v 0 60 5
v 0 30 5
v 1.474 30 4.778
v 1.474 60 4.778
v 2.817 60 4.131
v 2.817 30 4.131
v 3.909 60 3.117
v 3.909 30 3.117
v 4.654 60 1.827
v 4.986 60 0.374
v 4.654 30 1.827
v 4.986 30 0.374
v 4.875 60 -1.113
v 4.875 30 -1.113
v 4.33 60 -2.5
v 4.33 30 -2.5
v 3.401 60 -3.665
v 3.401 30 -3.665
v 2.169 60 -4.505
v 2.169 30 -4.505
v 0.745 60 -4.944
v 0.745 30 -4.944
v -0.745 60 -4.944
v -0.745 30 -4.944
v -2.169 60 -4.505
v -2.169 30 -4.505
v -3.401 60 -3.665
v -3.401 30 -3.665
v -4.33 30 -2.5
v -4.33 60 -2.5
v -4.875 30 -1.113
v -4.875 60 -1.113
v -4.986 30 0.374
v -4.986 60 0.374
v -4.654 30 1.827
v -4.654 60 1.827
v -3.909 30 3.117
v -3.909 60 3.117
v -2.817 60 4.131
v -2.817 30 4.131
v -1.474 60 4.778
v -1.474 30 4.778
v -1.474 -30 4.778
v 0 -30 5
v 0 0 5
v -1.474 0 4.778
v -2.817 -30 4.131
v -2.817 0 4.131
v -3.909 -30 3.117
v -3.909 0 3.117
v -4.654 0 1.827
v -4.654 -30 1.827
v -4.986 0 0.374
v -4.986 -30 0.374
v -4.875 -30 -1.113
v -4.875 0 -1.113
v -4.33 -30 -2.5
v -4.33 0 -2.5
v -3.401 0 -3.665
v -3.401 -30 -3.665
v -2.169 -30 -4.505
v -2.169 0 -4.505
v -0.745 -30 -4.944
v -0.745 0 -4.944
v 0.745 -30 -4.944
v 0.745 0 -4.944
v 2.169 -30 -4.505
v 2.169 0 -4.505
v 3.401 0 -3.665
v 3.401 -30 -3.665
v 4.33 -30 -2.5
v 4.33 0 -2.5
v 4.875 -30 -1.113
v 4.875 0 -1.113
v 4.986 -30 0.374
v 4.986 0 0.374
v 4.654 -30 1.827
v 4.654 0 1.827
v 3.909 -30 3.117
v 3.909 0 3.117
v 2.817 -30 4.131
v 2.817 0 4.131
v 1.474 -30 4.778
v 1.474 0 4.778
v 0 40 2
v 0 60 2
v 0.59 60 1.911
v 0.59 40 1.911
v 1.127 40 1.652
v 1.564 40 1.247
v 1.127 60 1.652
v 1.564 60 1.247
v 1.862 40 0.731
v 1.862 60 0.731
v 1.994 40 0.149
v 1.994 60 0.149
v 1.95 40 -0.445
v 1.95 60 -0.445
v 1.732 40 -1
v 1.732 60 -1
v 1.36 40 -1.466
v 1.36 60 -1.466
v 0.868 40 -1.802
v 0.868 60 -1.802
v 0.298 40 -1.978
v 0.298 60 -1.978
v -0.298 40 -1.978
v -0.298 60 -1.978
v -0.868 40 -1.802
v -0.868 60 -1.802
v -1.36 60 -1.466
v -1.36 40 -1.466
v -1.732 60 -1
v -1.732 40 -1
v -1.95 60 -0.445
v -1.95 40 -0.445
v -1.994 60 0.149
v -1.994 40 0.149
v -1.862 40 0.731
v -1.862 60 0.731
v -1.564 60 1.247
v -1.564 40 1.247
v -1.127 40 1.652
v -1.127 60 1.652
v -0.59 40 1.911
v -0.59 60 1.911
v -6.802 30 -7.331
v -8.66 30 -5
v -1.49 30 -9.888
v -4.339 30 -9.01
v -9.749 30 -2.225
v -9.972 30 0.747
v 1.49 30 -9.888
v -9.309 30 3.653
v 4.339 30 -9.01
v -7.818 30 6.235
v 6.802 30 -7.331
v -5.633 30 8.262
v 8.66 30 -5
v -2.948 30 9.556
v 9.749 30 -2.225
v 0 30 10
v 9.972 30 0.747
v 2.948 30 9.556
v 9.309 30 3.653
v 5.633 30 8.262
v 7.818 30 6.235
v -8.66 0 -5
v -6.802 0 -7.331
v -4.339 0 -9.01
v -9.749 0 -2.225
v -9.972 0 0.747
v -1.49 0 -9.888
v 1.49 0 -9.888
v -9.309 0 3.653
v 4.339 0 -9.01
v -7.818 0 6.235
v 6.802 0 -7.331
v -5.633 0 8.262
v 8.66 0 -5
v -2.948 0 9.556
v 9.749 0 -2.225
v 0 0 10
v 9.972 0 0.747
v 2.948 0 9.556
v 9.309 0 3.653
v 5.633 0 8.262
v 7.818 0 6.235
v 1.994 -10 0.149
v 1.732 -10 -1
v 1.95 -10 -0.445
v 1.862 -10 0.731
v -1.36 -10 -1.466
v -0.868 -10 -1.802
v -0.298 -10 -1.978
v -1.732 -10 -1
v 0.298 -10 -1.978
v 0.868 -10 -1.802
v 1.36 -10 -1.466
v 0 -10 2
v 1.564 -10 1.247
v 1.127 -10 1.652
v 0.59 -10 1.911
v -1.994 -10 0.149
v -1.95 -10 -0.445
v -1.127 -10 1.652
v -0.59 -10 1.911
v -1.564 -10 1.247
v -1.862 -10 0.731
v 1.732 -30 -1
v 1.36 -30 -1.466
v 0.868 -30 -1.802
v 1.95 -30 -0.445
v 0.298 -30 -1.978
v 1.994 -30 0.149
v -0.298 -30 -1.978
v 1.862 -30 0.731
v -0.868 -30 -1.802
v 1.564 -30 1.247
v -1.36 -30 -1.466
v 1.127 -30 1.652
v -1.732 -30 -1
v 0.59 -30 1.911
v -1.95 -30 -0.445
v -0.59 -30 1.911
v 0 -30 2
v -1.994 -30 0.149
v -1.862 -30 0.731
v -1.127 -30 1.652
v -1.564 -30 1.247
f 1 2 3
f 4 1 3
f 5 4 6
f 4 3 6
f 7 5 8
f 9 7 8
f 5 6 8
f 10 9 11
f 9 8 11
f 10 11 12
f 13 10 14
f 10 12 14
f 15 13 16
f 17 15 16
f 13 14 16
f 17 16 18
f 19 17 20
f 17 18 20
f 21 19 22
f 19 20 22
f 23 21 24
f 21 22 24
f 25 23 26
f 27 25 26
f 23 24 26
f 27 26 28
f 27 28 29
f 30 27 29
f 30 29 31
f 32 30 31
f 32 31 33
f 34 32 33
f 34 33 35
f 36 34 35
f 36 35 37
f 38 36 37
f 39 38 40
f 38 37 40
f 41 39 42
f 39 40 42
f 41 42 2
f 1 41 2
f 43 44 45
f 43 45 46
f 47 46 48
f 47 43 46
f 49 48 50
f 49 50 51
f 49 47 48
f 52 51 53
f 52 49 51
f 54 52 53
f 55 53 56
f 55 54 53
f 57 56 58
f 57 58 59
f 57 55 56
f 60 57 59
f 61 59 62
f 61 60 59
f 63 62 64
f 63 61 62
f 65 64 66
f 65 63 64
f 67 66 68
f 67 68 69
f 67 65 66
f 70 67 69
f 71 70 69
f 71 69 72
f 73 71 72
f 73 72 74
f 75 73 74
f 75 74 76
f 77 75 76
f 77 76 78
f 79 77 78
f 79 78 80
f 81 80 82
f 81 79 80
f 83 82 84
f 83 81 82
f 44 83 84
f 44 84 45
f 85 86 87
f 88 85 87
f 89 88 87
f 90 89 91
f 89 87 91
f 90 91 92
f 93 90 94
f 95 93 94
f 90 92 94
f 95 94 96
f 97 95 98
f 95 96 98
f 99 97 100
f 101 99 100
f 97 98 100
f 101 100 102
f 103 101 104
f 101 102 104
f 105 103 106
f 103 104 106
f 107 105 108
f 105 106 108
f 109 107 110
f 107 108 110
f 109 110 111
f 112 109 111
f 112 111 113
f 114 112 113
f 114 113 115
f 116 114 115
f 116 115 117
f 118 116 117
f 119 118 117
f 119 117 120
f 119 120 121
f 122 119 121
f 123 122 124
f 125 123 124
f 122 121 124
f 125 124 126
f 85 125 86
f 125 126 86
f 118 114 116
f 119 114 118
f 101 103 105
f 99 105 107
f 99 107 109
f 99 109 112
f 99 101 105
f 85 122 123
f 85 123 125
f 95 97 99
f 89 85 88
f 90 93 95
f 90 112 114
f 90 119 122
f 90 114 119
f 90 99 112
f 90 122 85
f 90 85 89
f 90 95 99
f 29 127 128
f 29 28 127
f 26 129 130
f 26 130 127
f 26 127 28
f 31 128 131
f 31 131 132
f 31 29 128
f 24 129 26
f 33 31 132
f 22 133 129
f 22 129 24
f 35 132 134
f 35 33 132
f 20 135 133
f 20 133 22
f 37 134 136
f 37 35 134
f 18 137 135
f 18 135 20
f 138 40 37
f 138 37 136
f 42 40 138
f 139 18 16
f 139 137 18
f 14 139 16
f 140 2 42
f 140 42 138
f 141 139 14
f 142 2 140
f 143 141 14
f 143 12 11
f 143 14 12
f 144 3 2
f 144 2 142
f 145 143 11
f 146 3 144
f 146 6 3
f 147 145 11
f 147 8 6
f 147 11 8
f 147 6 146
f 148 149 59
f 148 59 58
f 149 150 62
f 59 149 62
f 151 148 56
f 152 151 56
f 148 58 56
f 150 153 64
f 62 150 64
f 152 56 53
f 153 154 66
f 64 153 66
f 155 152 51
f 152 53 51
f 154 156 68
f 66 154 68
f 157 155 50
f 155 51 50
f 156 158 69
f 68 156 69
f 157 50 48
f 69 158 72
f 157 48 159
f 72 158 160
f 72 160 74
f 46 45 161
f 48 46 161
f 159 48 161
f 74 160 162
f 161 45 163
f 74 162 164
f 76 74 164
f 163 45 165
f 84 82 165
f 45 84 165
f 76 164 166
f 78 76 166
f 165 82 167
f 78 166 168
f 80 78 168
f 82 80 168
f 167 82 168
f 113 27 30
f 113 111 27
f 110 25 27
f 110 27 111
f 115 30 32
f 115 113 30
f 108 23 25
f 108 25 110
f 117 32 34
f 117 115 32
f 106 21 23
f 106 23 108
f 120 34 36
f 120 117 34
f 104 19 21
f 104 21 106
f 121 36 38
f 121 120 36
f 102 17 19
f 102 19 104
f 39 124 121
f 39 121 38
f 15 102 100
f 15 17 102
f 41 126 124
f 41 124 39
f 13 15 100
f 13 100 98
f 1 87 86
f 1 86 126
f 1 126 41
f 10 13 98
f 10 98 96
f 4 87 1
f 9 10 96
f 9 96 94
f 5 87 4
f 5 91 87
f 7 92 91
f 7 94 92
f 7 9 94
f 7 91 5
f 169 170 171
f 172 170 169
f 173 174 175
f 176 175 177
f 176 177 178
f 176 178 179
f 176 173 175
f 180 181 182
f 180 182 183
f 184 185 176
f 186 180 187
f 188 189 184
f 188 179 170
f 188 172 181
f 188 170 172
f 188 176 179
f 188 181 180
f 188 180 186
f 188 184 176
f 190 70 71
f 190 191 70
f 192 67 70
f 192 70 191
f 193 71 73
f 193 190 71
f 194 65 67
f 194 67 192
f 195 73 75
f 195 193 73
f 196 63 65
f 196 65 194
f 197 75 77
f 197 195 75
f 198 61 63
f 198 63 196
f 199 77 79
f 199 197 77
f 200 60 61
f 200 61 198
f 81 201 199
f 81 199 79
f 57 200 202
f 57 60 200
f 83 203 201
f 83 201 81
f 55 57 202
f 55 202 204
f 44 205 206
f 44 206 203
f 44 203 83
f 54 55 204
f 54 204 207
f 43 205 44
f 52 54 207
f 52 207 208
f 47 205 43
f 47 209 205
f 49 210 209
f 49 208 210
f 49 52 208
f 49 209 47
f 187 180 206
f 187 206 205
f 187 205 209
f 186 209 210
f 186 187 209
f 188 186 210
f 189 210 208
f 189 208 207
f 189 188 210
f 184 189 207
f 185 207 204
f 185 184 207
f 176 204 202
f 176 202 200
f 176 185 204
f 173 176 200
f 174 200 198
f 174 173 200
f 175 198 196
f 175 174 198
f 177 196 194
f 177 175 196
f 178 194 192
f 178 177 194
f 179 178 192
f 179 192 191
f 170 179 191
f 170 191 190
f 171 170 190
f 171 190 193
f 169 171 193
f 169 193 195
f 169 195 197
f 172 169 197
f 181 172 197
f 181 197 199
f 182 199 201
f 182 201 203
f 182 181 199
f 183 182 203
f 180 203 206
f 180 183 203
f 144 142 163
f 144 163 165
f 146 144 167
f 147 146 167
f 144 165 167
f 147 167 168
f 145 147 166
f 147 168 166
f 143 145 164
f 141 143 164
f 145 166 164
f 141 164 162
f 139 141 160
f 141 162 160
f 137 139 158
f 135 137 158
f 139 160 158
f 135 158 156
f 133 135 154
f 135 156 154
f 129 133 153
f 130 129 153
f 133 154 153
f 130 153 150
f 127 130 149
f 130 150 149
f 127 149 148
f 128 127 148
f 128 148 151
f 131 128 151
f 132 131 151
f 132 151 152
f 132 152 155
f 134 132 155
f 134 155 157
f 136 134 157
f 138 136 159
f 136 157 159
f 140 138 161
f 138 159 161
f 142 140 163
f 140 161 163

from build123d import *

# Parameters (mm, degrees)
SKETCH_1_R          = 10
EXTRUDE_1_DEPTH     = 30
SKETCH_2_R          = 5
EXTRUDE_2_DEPTH     = 30
EXTRUDE_START       = 30
SKETCH_3_R          = 5
EXTRUDE_3_DEPTH     = 30
SKETCH_4_R          = 2
CUT_EXTRUDE_1_DEPTH = 20
CUT_EXTRUDE_START   = -20
SKETCH_5_R          = 2
CUT_EXTRUDE_2_DEPTH = 20


with BuildPart() as part:
    # 草图1 → 凸台-拉伸1 (new body)
    with BuildSketch(Plane(origin=(0, 0, 0), x_dir=(1, 0, 0), z_dir=(0, 1, 0))):
        with Locations(Location((0, 0, 0), (0, 0, 270))):
            Circle(SKETCH_1_R)
    extrude(amount=EXTRUDE_1_DEPTH)

    # 草图2 → 凸台-拉伸2 (add)
    with BuildSketch(Plane(origin=(0, 30, 0), x_dir=(1, 0, 0), z_dir=(0, 1, 0))):
        with Locations(Location((0, 0, 0), (0, 0, 270))):
            Circle(SKETCH_2_R)
    extrude(amount=EXTRUDE_2_DEPTH)

    # 草图3 → 凸台-拉伸3 (add)
    with BuildSketch(Plane(origin=(0, 0, 0), x_dir=(-1, 0, 0), z_dir=(0, -1, 0)).offset(EXTRUDE_START)):
        with Locations(Location((0, 0, 0), (0, 0, 270))):
            Circle(SKETCH_3_R)
    extrude(amount=-EXTRUDE_3_DEPTH)

    # 草图4 → 切除-拉伸1 (cut)
    with BuildSketch(Plane(origin=(0, 60, 0), x_dir=(1, 0, 0), z_dir=(0, 1, 0))):
        with Locations(Location((0, 0, 0), (0, 0, 270))):
            Circle(SKETCH_4_R)
    extrude(amount=-CUT_EXTRUDE_1_DEPTH, mode=Mode.SUBTRACT)

    # 草图5 → 切除-拉伸2 (cut)
    with BuildSketch(Plane(origin=(0, -30, 0), x_dir=(-1, 0, 0), z_dir=(0, -1, 0)).offset(CUT_EXTRUDE_START)):
        with Locations(Location((0, 0, 0), (0, 0, 270))):
            Circle(SKETCH_5_R)
    extrude(amount=CUT_EXTRUDE_2_DEPTH, mode=Mode.SUBTRACT)


solid = part.part
